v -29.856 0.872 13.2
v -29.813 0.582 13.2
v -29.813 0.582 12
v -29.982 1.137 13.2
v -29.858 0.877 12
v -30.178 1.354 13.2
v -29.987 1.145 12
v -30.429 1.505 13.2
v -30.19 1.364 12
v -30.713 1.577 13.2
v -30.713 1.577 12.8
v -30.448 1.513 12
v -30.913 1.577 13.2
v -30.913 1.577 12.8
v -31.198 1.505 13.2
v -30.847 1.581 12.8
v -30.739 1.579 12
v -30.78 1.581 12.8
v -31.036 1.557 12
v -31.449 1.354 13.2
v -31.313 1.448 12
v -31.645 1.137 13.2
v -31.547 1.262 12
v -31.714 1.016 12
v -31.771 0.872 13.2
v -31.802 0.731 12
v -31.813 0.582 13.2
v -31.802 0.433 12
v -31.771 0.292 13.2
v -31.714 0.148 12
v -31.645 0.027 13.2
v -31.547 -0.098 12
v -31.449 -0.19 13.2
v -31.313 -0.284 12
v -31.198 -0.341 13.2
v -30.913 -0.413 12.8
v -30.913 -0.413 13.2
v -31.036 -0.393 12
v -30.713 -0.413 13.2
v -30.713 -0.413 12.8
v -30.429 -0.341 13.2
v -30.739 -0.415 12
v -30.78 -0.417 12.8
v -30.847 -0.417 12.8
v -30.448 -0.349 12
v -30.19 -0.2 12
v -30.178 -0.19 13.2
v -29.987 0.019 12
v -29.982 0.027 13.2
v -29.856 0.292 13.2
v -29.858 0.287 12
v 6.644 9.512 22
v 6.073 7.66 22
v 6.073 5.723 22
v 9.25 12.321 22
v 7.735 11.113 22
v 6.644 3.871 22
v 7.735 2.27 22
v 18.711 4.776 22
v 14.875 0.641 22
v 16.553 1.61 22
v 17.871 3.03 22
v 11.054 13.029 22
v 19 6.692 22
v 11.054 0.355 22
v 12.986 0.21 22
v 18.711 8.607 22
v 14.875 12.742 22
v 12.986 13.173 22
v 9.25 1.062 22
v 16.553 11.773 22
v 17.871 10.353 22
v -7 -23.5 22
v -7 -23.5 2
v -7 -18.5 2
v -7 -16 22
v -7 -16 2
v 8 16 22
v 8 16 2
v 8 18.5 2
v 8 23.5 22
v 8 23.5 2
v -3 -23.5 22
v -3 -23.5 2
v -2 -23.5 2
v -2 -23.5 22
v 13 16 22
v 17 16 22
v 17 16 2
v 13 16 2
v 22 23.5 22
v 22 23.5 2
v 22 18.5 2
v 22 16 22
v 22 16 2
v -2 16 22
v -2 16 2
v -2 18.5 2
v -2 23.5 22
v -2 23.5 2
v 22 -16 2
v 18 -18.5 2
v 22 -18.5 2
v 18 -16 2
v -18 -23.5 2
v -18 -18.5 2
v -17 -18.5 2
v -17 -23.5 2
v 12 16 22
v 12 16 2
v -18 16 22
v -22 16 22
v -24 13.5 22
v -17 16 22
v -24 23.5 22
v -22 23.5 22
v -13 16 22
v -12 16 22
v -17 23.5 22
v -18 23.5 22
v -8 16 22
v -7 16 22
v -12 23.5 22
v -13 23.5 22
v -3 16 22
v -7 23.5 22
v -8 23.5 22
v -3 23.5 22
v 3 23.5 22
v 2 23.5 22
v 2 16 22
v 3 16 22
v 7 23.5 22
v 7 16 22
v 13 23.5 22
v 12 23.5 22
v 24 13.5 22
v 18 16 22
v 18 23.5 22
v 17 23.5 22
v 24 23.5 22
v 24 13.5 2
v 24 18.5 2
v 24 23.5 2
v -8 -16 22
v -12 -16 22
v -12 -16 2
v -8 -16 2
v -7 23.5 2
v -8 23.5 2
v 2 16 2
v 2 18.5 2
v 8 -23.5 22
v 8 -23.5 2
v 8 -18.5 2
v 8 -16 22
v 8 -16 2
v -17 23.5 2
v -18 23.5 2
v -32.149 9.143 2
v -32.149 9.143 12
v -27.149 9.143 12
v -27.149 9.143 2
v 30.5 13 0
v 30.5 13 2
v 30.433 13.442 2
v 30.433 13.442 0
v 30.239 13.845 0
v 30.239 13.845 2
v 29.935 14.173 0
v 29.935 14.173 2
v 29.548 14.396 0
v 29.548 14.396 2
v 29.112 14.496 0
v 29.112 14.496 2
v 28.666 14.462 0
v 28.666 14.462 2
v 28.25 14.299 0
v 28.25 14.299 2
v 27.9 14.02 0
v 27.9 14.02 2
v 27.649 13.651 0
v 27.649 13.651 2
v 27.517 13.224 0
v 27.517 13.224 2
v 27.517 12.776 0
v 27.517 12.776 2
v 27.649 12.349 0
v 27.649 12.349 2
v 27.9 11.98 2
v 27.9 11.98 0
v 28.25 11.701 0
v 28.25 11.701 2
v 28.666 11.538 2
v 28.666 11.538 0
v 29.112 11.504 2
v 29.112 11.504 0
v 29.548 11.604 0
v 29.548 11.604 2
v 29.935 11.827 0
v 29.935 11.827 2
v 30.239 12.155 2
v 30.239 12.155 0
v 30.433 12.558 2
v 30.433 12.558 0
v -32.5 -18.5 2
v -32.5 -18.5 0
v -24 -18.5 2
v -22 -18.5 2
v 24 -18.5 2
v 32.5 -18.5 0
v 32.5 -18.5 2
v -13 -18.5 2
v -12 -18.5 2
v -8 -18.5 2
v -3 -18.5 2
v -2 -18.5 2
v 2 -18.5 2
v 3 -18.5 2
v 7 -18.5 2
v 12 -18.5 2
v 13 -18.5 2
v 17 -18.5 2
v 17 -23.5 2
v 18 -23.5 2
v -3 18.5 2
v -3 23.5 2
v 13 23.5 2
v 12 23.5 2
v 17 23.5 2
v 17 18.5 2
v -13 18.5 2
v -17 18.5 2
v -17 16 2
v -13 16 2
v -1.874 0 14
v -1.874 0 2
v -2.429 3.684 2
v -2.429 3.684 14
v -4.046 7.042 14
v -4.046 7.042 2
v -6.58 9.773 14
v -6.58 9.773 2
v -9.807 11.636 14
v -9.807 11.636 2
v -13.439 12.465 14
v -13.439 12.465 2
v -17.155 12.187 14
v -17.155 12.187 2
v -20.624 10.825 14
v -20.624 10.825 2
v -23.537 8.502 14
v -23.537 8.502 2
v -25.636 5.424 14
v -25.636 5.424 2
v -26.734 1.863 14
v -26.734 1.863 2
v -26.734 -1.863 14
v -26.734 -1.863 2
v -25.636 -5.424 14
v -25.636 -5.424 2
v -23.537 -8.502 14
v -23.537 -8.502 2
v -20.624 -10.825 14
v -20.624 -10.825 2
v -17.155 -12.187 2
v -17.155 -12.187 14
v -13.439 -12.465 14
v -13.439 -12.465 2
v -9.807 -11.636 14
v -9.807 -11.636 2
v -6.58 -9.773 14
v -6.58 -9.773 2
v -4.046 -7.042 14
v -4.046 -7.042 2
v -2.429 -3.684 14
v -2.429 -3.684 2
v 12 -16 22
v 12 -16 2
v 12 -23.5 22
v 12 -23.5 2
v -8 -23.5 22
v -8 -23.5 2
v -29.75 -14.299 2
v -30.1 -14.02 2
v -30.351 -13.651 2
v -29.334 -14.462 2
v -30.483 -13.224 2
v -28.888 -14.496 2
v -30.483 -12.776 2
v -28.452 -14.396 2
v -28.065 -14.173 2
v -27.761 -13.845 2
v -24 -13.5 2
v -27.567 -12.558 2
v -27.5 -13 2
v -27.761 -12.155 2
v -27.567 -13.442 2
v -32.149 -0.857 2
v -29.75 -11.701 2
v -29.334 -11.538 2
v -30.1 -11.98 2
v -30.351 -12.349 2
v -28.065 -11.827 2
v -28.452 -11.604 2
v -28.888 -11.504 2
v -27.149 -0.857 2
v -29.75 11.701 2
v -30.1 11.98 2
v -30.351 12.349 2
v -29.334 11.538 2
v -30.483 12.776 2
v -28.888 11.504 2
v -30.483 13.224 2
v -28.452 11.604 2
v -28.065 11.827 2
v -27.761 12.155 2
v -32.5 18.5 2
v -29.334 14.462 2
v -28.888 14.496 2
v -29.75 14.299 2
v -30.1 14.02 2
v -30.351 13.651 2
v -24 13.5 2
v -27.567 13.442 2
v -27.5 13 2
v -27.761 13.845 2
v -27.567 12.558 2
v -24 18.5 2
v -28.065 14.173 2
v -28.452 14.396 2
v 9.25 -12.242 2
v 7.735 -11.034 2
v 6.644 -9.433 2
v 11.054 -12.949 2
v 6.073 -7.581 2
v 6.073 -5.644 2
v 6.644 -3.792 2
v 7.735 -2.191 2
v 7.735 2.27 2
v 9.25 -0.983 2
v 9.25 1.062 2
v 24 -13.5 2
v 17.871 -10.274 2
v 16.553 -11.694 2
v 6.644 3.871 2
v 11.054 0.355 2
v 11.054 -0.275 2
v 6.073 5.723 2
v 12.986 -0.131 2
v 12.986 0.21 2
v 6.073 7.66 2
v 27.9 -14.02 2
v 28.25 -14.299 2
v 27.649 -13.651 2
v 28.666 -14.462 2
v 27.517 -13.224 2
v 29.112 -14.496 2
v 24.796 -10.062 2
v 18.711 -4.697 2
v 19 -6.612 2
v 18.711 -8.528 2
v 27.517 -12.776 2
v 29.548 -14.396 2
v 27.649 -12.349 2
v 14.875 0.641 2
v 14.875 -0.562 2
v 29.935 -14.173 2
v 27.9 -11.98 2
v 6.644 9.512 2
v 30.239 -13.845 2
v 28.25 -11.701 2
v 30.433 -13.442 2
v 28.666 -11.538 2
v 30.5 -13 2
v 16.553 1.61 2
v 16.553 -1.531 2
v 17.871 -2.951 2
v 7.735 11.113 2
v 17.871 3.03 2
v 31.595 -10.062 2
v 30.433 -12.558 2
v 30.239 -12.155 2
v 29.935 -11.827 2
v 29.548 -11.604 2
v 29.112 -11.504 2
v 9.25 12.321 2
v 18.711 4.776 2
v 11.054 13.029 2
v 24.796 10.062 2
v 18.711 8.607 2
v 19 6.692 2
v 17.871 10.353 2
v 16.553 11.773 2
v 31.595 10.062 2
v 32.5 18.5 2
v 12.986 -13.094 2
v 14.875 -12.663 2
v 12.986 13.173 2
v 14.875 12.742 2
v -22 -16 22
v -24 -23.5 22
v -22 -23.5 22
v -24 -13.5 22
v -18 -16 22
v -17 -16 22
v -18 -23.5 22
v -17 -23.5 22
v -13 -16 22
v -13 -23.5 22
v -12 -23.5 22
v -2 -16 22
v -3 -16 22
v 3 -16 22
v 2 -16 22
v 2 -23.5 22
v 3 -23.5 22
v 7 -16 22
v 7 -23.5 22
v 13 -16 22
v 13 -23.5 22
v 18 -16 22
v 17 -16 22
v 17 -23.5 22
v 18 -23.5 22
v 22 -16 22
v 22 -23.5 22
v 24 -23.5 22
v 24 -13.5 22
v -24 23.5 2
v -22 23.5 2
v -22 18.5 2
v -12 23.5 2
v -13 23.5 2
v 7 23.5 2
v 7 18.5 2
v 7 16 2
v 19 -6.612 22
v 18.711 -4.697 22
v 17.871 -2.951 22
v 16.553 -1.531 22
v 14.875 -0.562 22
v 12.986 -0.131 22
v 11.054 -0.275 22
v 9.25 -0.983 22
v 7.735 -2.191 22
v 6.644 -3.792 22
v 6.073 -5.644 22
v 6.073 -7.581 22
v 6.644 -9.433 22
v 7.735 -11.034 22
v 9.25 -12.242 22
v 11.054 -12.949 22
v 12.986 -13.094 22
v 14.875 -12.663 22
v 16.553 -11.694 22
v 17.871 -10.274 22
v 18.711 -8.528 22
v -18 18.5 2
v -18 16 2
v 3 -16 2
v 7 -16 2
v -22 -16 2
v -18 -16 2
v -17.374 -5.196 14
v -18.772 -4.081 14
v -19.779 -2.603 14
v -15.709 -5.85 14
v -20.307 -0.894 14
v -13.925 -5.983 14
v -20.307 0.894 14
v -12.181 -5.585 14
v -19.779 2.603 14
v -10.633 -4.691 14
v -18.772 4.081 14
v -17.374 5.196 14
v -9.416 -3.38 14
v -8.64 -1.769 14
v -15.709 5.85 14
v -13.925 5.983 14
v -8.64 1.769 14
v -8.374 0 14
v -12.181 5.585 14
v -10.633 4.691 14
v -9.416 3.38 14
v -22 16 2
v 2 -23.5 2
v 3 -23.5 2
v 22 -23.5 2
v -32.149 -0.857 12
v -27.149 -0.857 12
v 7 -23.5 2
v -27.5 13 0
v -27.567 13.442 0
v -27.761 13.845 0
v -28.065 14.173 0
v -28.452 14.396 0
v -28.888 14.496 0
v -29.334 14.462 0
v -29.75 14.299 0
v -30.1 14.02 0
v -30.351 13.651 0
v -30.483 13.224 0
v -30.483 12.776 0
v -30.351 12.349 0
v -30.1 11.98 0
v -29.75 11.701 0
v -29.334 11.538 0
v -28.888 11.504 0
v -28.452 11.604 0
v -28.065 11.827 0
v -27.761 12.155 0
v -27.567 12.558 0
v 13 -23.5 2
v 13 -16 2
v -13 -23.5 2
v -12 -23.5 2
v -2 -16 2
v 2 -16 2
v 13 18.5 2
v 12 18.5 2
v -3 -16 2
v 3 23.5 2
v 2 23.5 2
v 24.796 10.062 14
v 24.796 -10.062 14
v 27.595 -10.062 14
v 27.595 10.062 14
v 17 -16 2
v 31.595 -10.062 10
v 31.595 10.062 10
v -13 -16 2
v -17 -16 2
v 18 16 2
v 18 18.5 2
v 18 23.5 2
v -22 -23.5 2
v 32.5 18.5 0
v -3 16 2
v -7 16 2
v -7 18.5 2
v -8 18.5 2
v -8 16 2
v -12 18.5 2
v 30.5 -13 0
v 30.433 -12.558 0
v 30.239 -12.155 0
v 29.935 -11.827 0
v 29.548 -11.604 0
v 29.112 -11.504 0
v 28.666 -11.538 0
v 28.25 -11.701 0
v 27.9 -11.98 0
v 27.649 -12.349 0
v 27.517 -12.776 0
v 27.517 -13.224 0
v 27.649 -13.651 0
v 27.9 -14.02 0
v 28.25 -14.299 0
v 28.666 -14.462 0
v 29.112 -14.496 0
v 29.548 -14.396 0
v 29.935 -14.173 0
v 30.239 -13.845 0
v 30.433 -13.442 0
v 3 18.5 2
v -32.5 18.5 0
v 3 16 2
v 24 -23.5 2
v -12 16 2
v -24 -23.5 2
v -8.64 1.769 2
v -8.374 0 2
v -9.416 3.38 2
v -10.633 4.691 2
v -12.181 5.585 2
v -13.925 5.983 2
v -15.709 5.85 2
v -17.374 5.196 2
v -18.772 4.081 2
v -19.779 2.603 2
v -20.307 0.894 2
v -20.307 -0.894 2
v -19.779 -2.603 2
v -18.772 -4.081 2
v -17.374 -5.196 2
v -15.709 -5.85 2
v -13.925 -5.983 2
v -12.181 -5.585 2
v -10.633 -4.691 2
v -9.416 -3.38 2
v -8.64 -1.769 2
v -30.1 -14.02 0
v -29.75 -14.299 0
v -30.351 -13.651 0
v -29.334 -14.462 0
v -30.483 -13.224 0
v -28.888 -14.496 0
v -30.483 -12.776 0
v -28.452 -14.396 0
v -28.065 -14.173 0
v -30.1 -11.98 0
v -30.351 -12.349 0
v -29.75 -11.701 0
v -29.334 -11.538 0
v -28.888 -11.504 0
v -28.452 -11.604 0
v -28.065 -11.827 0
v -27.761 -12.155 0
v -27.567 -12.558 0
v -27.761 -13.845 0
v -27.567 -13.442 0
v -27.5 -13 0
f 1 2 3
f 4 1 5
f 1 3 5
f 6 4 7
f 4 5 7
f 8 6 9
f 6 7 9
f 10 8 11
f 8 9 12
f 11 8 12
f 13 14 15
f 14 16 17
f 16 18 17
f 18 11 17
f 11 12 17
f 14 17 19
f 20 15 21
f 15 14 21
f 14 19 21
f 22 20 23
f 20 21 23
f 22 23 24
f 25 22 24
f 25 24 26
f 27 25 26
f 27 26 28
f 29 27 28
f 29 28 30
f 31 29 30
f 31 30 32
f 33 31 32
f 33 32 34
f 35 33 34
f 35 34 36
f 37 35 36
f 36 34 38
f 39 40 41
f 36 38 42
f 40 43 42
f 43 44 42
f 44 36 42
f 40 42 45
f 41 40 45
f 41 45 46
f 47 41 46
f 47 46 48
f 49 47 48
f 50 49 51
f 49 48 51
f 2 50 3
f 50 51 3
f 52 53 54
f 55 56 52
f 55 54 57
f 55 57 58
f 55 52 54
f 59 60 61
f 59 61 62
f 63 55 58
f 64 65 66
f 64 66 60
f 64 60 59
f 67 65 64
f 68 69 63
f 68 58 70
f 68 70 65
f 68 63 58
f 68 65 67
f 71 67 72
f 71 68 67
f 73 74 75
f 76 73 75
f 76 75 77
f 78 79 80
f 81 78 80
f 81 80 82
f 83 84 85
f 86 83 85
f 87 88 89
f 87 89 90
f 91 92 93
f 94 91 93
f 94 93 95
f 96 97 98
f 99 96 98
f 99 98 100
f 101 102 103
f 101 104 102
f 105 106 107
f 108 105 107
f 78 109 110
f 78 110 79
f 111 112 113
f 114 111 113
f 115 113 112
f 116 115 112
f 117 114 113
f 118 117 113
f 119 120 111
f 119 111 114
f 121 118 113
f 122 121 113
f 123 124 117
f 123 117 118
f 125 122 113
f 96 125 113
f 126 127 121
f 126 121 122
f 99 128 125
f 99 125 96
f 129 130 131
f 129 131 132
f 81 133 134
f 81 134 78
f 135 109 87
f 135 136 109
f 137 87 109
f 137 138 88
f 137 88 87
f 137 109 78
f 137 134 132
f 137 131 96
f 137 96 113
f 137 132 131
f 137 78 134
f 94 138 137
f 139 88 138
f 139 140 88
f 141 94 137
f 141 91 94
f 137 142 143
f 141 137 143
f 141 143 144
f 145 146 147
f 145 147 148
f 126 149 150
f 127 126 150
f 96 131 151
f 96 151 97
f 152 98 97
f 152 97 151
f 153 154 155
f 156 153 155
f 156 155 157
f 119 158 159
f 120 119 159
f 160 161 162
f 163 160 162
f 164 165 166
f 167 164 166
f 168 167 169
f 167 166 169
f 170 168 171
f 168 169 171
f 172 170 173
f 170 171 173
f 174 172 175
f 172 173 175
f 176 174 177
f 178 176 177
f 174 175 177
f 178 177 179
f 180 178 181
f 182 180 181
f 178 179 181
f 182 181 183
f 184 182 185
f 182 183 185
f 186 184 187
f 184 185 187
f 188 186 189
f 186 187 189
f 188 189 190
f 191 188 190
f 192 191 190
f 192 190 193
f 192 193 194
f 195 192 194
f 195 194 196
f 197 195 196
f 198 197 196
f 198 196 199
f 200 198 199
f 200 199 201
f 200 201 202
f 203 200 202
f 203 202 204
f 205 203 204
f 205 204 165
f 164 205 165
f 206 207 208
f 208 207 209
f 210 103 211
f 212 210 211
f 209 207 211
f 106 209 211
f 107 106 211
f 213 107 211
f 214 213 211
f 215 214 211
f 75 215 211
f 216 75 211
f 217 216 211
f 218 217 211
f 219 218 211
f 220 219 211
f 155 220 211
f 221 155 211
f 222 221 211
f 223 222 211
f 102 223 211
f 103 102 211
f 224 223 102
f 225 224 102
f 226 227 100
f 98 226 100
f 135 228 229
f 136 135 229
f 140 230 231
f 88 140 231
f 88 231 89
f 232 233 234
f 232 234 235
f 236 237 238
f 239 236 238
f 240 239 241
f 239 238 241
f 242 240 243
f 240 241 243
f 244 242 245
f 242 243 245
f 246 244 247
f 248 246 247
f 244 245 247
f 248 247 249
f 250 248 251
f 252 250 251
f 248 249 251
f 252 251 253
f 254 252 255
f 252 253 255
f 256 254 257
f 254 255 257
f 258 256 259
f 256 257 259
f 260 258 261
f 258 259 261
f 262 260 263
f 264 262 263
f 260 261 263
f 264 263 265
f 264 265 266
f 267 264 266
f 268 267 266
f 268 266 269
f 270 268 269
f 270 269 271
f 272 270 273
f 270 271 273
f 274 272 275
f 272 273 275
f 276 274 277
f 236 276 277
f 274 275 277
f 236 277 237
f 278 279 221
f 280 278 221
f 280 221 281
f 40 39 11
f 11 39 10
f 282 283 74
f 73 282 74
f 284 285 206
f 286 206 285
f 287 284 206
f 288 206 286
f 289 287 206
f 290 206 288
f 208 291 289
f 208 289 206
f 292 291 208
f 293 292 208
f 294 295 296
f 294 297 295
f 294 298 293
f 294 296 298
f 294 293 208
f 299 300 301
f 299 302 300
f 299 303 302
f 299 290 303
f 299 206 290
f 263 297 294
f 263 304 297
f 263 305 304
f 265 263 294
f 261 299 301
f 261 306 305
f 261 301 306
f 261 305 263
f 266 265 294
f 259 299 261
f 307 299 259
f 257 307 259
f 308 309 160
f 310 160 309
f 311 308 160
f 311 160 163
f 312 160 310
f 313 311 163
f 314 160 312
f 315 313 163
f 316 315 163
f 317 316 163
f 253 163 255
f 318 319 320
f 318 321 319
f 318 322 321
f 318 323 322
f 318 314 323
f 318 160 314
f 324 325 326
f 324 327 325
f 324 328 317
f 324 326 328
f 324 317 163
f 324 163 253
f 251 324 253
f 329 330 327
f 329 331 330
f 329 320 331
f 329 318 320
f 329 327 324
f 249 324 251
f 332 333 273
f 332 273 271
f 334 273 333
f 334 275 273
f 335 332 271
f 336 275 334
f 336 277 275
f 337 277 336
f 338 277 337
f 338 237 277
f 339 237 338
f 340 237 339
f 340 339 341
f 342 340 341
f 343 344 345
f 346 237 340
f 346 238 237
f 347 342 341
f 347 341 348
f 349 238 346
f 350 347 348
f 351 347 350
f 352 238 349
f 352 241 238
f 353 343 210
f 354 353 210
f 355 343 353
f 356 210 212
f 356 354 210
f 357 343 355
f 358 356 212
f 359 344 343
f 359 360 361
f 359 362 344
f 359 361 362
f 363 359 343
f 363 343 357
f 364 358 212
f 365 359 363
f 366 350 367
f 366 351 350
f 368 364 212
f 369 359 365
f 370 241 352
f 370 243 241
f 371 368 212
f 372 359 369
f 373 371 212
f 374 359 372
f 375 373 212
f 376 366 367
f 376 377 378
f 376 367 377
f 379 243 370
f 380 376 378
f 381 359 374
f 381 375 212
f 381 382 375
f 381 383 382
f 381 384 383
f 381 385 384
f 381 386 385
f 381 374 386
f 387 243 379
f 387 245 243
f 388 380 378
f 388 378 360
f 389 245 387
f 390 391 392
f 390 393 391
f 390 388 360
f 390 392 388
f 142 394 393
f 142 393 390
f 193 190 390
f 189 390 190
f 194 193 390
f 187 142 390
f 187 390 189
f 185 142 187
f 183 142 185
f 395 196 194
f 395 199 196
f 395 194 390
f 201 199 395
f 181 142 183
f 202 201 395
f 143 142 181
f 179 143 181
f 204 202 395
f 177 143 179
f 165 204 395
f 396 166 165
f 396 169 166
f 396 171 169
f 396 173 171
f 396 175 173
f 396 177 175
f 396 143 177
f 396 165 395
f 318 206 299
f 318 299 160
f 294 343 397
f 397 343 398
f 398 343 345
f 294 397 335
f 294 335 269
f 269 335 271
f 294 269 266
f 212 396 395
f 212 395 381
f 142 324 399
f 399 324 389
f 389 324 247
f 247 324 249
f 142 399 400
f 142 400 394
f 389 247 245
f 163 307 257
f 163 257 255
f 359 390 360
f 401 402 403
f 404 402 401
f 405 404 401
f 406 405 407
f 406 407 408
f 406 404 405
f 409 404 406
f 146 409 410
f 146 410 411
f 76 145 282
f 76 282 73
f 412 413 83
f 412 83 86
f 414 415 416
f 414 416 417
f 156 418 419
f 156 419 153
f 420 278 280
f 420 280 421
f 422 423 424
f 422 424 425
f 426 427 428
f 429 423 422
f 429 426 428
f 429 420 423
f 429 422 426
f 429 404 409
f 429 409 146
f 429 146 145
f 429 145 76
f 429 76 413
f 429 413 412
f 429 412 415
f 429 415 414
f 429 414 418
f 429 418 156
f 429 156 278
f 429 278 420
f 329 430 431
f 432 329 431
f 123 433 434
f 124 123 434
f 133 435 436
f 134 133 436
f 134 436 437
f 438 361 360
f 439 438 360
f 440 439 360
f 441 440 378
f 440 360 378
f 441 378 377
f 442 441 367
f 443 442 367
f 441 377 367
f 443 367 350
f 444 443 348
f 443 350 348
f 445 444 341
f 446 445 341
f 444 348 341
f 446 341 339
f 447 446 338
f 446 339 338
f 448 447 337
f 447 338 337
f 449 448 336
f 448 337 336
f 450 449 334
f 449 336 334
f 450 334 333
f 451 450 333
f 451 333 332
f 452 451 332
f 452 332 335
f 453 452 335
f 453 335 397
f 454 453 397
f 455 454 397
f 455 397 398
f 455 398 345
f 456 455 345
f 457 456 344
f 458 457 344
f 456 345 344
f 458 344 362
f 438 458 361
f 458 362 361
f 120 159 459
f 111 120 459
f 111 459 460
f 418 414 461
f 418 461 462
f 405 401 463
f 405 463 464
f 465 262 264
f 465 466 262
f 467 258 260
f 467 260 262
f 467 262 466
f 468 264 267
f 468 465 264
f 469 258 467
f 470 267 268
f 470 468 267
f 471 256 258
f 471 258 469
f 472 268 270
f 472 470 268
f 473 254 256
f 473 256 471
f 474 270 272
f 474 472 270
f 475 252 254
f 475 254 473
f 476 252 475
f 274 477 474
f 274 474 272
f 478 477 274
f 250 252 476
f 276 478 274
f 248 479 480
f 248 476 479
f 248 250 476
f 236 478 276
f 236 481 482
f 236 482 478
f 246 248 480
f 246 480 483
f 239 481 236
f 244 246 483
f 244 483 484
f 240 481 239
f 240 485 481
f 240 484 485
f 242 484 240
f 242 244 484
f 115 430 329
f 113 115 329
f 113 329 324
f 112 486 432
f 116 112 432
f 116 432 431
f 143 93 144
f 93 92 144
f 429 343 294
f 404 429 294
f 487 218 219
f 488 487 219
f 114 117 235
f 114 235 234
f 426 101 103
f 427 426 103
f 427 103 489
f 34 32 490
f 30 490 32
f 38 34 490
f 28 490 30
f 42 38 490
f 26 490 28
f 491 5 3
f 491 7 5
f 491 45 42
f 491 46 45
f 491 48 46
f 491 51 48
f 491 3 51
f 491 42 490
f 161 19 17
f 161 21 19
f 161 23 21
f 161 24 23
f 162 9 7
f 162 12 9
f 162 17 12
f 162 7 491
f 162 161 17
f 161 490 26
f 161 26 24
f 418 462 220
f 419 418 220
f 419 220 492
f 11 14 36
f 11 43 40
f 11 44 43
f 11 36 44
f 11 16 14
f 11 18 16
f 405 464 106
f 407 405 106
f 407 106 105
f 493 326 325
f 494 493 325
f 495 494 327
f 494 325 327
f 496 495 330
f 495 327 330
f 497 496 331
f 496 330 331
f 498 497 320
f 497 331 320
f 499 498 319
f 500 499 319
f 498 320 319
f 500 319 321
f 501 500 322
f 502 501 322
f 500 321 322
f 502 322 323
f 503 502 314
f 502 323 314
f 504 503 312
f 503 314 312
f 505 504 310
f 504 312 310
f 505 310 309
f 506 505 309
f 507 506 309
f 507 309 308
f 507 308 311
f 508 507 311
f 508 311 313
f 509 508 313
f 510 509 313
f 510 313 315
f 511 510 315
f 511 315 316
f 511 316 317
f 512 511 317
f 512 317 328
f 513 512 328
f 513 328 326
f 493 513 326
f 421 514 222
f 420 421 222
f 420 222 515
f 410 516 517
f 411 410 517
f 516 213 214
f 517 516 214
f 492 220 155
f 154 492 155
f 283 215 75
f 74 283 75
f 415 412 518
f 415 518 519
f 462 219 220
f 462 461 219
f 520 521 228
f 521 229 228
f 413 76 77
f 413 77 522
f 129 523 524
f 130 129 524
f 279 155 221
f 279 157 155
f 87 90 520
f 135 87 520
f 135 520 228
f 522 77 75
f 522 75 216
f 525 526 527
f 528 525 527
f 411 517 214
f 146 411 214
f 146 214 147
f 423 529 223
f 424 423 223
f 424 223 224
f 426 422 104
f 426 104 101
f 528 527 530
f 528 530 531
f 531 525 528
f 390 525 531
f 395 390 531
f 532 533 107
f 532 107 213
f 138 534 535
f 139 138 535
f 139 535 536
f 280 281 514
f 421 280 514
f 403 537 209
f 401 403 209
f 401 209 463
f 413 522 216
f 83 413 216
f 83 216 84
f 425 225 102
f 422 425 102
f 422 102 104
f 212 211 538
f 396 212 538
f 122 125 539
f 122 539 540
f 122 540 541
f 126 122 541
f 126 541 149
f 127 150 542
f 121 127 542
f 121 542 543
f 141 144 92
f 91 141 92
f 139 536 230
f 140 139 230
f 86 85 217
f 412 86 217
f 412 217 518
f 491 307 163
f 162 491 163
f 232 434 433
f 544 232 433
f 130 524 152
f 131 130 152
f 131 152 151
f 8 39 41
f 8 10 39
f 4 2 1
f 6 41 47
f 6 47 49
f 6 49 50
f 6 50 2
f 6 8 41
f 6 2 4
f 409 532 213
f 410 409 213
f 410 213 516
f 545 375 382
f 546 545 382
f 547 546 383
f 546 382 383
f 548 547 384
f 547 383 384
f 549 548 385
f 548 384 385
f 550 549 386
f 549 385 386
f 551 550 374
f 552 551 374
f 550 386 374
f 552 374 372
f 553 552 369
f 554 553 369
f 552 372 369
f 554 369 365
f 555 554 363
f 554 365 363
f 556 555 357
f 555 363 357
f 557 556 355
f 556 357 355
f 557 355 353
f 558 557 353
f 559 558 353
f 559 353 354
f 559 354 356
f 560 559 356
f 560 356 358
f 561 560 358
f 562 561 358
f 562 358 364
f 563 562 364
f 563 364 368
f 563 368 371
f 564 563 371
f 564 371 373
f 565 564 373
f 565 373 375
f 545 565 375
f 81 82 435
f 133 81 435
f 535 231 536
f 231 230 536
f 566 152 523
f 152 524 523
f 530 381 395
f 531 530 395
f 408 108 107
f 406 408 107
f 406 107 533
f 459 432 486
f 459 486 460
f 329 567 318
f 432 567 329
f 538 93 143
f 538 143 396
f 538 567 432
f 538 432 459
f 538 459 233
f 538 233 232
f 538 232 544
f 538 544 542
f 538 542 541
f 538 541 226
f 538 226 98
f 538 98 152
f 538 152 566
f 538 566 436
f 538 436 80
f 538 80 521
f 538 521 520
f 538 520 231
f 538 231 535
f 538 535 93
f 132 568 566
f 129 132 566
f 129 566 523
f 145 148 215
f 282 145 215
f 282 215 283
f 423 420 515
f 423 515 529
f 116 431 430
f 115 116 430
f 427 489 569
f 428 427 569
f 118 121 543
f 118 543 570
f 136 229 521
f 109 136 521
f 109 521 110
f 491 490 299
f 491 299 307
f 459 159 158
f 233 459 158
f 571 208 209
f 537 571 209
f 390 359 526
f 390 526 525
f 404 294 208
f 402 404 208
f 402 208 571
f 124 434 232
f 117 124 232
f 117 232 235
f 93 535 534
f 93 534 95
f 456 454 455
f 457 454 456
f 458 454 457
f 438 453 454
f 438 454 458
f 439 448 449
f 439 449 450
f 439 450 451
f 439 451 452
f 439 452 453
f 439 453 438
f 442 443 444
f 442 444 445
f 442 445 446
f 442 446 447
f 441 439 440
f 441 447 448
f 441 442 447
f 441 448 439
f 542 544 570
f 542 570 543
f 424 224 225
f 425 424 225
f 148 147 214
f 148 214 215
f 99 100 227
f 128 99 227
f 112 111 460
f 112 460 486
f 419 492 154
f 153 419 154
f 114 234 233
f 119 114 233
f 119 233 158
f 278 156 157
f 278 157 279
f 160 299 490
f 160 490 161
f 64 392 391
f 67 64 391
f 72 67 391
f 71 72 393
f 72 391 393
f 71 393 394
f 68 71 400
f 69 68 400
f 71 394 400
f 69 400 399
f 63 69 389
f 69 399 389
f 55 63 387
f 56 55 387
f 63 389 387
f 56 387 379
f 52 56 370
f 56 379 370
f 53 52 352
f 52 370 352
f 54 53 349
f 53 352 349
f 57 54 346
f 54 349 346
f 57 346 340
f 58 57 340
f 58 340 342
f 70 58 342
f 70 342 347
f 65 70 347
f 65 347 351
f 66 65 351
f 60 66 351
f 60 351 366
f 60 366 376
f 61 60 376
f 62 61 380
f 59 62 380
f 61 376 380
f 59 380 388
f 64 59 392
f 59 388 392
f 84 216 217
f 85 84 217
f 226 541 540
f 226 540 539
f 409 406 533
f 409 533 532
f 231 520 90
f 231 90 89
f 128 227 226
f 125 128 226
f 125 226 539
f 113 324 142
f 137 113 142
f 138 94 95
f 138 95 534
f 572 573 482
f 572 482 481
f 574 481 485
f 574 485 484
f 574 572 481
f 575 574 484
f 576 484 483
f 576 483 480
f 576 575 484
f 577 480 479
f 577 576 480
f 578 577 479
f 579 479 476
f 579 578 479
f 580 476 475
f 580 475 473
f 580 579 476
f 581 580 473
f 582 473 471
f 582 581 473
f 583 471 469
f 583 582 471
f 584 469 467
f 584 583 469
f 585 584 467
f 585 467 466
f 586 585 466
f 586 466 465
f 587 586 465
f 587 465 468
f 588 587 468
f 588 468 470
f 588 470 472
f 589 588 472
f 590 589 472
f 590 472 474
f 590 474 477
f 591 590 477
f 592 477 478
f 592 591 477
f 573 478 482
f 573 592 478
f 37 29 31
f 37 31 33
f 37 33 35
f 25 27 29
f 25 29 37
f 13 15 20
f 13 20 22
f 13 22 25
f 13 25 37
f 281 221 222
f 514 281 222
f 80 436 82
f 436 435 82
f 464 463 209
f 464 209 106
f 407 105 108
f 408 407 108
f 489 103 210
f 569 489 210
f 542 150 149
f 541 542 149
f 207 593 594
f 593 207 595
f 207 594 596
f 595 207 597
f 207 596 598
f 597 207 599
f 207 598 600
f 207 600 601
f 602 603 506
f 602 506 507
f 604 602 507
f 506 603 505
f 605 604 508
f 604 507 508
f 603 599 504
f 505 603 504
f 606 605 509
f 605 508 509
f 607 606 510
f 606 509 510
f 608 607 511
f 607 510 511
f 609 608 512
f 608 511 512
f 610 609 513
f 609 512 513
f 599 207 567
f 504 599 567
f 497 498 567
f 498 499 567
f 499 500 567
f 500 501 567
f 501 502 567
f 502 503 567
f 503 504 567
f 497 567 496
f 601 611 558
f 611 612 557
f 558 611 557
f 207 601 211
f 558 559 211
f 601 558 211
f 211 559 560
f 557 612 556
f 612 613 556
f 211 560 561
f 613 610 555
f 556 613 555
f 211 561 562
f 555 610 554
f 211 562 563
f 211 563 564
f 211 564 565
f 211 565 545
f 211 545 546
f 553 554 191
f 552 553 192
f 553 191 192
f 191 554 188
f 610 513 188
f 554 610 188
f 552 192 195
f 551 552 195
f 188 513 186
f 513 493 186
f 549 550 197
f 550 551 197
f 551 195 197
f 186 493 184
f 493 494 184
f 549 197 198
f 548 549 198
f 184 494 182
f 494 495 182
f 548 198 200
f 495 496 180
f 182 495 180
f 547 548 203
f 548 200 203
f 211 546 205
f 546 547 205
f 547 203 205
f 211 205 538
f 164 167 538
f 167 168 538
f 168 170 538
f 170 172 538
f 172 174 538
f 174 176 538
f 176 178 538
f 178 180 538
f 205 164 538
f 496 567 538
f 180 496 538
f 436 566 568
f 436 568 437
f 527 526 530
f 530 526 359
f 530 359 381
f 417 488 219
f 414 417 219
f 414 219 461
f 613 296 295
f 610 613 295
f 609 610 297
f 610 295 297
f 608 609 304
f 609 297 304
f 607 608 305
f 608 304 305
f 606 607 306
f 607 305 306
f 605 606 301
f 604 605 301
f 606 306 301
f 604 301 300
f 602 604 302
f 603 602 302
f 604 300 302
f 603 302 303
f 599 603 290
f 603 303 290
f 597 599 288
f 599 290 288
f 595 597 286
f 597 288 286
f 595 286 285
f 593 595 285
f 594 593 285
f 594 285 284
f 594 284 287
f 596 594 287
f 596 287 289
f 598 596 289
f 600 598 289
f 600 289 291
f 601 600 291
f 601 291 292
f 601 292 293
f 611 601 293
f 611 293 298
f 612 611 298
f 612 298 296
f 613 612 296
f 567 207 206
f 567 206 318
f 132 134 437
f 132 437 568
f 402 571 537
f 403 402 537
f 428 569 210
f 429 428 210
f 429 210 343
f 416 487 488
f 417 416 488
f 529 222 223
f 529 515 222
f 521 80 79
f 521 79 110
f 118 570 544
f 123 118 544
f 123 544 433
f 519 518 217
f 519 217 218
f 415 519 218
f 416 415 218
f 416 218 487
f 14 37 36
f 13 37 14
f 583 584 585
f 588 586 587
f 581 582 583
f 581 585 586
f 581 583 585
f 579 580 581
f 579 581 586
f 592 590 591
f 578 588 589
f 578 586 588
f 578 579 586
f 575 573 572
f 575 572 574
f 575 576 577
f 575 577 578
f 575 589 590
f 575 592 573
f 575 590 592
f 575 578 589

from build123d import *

# Parameters (mm, degrees)
SKETCH_1_W          = 65
SKETCH_1_H          = 37
EXTRUDE_1_DEPTH     = 2
EXTRUDE_2_DEPTH     = 20
SKETCH_3_R          = 6.5
EXTRUDE_3_DEPTH     = 20
SKETCH_4_R          = 12.5
SKETCH_4_R_2        = 6
EXTRUDE_4_DEPTH     = 12
SKETCH_5_W          = 5
SKETCH_5_H          = 10
EXTRUDE_5_DEPTH     = 10
SKETCH_6_R          = 1
EXTRUDE_6_DEPTH     = 1.2
SKETCH_7_W          = 6.798722996
SKETCH_7_H          = 20.12306807
EXTRUDE_7_DEPTH     = 12
CHAMFER_1_SIZE      = 4
SKETCH_8_R          = 1.5
CUT_EXTRUDE_1_DEPTH = 3
SKETCH1_W           = 0.2
SKETCH1_H           = 2.227006651
CUT_EXTRUDE1_DEPTH  = 0.4


with BuildPart() as part:
    # Эскиз1 → Бобышка-Вытянуть1 (new body)
    with BuildSketch(Plane.XY):
        Rectangle(SKETCH_1_W, SKETCH_1_H)
    extrude(amount=EXTRUDE_1_DEPTH)

    # Эскиз2 → Бобышка-Вытянуть2 (add)
    with BuildSketch(Plane.XY.offset(2)):
        Polygon((-24, 23.5), (-24, 13.5), (24, 13.5), (24, 23.5), (22, 23.5), (22, 16), (18, 16), (18, 23.5), (17, 23.5), (17, 16), (13, 16), (13, 23.5), (12, 23.5), (12, 16), (8, 16), (8, 23.5), (7, 23.5), (7, 16), (3, 16), (3, 23.5), (2, 23.5), (2, 16), (-2, 16), (-2, 23.5), (-3, 23.5), (-3, 16), (-7, 16), (-7, 23.5), (-8, 23.5), (-8, 16), (-12, 16), (-12, 23.5), (-13, 23.5), (-13, 16), (-17, 16), (-17, 23.5), (-18, 23.5), (-18, 16), (-22, 16), (-22, 23.5), align=None)
        Polygon((22, -23.5), (24, -23.5), (24, -13.5), (-24, -13.5), (-24, -23.5), (-22, -23.5), (-22, -16), (-18, -16), (-18, -23.5), (-17, -23.5), (-17, -16), (-13, -16), (-13, -23.5), (-12, -23.5), (-12, -16), (-8, -16), (-8, -23.5), (-7, -23.5), (-7, -16), (-3, -16), (-3, -23.5), (-2, -23.5), (-2, -16), (2, -16), (2, -23.5), (3, -23.5), (3, -16), (7, -16), (7, -23.5), (8, -23.5), (8, -16), (12, -16), (12, -23.5), (13, -23.5), (13, -16), (17, -16), (17, -23.5), (18, -23.5), (18, -16), (22, -16), align=None)
    extrude(amount=EXTRUDE_2_DEPTH)

    # Эскиз3 → Бобышка-Вытянуть3 (add)
    with BuildSketch(Plane.XY.offset(2)):
        with Locations((12.5, 6.691570058)):
            Circle(SKETCH_3_R)
        with Locations((12.5, -6.612413993)):
            Circle(SKETCH_3_R)
    extrude(amount=EXTRUDE_3_DEPTH)

    # Эскиз4 → Бобышка-Вытянуть4 (add)
    with BuildSketch(Plane.XY.offset(2)):
        with Locations((-14.373526478, 0)):
            Circle(SKETCH_4_R)
        with Locations((-14.373526478, 0)):
            Circle(SKETCH_4_R_2, mode=Mode.SUBTRACT)
    extrude(amount=EXTRUDE_4_DEPTH)

    # Эскиз5 → Бобышка-Вытянуть5 (add)
    with BuildSketch(Plane.XY.offset(2)):
        with Locations((-29.649429854, 4.142703247)):
            Rectangle(SKETCH_5_W, SKETCH_5_H)
    extrude(amount=EXTRUDE_5_DEPTH)

    # Эскиз6 → Бобышка-Вытянуть6 (add)
    with BuildSketch(Plane.XY.offset(12)):
        with Locations((-30.813495229, 0.582032688)):
            Circle(SKETCH_6_R)
    extrude(amount=EXTRUDE_6_DEPTH)

    # Эскиз7 → Бобышка-Вытянуть7 (add)
    with BuildSketch(Plane.XY.offset(2)):
        with Locations((28.195350692, 0)):
            Rectangle(SKETCH_7_W, SKETCH_7_H)
    extrude(amount=EXTRUDE_7_DEPTH)

    # Фаска1
    chamfer_1_edges = [part.edges().sort_by_distance(p)[0] for p in [
        (31.59471219, 0, 14),
    ]]
    chamfer(chamfer_1_edges, length=CHAMFER_1_SIZE)

    # Эскиз8 → Вырез-Вытянуть1 (cut, through all)
    with BuildSketch(Plane.XY.offset(2)):
        with Locations((-29, 13)):
            Circle(SKETCH_8_R)
        with Locations((29, 13)):
            Circle(SKETCH_8_R)
        with Locations((29, -13)):
            Circle(SKETCH_8_R)
        with Locations((-29, -13)):
            Circle(SKETCH_8_R)
    extrude(amount=-CUT_EXTRUDE_1_DEPTH, mode=Mode.SUBTRACT)

    # Sketch1 → Cut-Extrude1 (cut)
    with BuildSketch(Plane.XY.offset(13.2)):
        with Locations((-30.813495229, 0.505684331)):
            Rectangle(SKETCH1_W, SKETCH1_H)
    extrude(amount=-CUT_EXTRUDE1_DEPTH, mode=Mode.SUBTRACT)


solid = part.part
